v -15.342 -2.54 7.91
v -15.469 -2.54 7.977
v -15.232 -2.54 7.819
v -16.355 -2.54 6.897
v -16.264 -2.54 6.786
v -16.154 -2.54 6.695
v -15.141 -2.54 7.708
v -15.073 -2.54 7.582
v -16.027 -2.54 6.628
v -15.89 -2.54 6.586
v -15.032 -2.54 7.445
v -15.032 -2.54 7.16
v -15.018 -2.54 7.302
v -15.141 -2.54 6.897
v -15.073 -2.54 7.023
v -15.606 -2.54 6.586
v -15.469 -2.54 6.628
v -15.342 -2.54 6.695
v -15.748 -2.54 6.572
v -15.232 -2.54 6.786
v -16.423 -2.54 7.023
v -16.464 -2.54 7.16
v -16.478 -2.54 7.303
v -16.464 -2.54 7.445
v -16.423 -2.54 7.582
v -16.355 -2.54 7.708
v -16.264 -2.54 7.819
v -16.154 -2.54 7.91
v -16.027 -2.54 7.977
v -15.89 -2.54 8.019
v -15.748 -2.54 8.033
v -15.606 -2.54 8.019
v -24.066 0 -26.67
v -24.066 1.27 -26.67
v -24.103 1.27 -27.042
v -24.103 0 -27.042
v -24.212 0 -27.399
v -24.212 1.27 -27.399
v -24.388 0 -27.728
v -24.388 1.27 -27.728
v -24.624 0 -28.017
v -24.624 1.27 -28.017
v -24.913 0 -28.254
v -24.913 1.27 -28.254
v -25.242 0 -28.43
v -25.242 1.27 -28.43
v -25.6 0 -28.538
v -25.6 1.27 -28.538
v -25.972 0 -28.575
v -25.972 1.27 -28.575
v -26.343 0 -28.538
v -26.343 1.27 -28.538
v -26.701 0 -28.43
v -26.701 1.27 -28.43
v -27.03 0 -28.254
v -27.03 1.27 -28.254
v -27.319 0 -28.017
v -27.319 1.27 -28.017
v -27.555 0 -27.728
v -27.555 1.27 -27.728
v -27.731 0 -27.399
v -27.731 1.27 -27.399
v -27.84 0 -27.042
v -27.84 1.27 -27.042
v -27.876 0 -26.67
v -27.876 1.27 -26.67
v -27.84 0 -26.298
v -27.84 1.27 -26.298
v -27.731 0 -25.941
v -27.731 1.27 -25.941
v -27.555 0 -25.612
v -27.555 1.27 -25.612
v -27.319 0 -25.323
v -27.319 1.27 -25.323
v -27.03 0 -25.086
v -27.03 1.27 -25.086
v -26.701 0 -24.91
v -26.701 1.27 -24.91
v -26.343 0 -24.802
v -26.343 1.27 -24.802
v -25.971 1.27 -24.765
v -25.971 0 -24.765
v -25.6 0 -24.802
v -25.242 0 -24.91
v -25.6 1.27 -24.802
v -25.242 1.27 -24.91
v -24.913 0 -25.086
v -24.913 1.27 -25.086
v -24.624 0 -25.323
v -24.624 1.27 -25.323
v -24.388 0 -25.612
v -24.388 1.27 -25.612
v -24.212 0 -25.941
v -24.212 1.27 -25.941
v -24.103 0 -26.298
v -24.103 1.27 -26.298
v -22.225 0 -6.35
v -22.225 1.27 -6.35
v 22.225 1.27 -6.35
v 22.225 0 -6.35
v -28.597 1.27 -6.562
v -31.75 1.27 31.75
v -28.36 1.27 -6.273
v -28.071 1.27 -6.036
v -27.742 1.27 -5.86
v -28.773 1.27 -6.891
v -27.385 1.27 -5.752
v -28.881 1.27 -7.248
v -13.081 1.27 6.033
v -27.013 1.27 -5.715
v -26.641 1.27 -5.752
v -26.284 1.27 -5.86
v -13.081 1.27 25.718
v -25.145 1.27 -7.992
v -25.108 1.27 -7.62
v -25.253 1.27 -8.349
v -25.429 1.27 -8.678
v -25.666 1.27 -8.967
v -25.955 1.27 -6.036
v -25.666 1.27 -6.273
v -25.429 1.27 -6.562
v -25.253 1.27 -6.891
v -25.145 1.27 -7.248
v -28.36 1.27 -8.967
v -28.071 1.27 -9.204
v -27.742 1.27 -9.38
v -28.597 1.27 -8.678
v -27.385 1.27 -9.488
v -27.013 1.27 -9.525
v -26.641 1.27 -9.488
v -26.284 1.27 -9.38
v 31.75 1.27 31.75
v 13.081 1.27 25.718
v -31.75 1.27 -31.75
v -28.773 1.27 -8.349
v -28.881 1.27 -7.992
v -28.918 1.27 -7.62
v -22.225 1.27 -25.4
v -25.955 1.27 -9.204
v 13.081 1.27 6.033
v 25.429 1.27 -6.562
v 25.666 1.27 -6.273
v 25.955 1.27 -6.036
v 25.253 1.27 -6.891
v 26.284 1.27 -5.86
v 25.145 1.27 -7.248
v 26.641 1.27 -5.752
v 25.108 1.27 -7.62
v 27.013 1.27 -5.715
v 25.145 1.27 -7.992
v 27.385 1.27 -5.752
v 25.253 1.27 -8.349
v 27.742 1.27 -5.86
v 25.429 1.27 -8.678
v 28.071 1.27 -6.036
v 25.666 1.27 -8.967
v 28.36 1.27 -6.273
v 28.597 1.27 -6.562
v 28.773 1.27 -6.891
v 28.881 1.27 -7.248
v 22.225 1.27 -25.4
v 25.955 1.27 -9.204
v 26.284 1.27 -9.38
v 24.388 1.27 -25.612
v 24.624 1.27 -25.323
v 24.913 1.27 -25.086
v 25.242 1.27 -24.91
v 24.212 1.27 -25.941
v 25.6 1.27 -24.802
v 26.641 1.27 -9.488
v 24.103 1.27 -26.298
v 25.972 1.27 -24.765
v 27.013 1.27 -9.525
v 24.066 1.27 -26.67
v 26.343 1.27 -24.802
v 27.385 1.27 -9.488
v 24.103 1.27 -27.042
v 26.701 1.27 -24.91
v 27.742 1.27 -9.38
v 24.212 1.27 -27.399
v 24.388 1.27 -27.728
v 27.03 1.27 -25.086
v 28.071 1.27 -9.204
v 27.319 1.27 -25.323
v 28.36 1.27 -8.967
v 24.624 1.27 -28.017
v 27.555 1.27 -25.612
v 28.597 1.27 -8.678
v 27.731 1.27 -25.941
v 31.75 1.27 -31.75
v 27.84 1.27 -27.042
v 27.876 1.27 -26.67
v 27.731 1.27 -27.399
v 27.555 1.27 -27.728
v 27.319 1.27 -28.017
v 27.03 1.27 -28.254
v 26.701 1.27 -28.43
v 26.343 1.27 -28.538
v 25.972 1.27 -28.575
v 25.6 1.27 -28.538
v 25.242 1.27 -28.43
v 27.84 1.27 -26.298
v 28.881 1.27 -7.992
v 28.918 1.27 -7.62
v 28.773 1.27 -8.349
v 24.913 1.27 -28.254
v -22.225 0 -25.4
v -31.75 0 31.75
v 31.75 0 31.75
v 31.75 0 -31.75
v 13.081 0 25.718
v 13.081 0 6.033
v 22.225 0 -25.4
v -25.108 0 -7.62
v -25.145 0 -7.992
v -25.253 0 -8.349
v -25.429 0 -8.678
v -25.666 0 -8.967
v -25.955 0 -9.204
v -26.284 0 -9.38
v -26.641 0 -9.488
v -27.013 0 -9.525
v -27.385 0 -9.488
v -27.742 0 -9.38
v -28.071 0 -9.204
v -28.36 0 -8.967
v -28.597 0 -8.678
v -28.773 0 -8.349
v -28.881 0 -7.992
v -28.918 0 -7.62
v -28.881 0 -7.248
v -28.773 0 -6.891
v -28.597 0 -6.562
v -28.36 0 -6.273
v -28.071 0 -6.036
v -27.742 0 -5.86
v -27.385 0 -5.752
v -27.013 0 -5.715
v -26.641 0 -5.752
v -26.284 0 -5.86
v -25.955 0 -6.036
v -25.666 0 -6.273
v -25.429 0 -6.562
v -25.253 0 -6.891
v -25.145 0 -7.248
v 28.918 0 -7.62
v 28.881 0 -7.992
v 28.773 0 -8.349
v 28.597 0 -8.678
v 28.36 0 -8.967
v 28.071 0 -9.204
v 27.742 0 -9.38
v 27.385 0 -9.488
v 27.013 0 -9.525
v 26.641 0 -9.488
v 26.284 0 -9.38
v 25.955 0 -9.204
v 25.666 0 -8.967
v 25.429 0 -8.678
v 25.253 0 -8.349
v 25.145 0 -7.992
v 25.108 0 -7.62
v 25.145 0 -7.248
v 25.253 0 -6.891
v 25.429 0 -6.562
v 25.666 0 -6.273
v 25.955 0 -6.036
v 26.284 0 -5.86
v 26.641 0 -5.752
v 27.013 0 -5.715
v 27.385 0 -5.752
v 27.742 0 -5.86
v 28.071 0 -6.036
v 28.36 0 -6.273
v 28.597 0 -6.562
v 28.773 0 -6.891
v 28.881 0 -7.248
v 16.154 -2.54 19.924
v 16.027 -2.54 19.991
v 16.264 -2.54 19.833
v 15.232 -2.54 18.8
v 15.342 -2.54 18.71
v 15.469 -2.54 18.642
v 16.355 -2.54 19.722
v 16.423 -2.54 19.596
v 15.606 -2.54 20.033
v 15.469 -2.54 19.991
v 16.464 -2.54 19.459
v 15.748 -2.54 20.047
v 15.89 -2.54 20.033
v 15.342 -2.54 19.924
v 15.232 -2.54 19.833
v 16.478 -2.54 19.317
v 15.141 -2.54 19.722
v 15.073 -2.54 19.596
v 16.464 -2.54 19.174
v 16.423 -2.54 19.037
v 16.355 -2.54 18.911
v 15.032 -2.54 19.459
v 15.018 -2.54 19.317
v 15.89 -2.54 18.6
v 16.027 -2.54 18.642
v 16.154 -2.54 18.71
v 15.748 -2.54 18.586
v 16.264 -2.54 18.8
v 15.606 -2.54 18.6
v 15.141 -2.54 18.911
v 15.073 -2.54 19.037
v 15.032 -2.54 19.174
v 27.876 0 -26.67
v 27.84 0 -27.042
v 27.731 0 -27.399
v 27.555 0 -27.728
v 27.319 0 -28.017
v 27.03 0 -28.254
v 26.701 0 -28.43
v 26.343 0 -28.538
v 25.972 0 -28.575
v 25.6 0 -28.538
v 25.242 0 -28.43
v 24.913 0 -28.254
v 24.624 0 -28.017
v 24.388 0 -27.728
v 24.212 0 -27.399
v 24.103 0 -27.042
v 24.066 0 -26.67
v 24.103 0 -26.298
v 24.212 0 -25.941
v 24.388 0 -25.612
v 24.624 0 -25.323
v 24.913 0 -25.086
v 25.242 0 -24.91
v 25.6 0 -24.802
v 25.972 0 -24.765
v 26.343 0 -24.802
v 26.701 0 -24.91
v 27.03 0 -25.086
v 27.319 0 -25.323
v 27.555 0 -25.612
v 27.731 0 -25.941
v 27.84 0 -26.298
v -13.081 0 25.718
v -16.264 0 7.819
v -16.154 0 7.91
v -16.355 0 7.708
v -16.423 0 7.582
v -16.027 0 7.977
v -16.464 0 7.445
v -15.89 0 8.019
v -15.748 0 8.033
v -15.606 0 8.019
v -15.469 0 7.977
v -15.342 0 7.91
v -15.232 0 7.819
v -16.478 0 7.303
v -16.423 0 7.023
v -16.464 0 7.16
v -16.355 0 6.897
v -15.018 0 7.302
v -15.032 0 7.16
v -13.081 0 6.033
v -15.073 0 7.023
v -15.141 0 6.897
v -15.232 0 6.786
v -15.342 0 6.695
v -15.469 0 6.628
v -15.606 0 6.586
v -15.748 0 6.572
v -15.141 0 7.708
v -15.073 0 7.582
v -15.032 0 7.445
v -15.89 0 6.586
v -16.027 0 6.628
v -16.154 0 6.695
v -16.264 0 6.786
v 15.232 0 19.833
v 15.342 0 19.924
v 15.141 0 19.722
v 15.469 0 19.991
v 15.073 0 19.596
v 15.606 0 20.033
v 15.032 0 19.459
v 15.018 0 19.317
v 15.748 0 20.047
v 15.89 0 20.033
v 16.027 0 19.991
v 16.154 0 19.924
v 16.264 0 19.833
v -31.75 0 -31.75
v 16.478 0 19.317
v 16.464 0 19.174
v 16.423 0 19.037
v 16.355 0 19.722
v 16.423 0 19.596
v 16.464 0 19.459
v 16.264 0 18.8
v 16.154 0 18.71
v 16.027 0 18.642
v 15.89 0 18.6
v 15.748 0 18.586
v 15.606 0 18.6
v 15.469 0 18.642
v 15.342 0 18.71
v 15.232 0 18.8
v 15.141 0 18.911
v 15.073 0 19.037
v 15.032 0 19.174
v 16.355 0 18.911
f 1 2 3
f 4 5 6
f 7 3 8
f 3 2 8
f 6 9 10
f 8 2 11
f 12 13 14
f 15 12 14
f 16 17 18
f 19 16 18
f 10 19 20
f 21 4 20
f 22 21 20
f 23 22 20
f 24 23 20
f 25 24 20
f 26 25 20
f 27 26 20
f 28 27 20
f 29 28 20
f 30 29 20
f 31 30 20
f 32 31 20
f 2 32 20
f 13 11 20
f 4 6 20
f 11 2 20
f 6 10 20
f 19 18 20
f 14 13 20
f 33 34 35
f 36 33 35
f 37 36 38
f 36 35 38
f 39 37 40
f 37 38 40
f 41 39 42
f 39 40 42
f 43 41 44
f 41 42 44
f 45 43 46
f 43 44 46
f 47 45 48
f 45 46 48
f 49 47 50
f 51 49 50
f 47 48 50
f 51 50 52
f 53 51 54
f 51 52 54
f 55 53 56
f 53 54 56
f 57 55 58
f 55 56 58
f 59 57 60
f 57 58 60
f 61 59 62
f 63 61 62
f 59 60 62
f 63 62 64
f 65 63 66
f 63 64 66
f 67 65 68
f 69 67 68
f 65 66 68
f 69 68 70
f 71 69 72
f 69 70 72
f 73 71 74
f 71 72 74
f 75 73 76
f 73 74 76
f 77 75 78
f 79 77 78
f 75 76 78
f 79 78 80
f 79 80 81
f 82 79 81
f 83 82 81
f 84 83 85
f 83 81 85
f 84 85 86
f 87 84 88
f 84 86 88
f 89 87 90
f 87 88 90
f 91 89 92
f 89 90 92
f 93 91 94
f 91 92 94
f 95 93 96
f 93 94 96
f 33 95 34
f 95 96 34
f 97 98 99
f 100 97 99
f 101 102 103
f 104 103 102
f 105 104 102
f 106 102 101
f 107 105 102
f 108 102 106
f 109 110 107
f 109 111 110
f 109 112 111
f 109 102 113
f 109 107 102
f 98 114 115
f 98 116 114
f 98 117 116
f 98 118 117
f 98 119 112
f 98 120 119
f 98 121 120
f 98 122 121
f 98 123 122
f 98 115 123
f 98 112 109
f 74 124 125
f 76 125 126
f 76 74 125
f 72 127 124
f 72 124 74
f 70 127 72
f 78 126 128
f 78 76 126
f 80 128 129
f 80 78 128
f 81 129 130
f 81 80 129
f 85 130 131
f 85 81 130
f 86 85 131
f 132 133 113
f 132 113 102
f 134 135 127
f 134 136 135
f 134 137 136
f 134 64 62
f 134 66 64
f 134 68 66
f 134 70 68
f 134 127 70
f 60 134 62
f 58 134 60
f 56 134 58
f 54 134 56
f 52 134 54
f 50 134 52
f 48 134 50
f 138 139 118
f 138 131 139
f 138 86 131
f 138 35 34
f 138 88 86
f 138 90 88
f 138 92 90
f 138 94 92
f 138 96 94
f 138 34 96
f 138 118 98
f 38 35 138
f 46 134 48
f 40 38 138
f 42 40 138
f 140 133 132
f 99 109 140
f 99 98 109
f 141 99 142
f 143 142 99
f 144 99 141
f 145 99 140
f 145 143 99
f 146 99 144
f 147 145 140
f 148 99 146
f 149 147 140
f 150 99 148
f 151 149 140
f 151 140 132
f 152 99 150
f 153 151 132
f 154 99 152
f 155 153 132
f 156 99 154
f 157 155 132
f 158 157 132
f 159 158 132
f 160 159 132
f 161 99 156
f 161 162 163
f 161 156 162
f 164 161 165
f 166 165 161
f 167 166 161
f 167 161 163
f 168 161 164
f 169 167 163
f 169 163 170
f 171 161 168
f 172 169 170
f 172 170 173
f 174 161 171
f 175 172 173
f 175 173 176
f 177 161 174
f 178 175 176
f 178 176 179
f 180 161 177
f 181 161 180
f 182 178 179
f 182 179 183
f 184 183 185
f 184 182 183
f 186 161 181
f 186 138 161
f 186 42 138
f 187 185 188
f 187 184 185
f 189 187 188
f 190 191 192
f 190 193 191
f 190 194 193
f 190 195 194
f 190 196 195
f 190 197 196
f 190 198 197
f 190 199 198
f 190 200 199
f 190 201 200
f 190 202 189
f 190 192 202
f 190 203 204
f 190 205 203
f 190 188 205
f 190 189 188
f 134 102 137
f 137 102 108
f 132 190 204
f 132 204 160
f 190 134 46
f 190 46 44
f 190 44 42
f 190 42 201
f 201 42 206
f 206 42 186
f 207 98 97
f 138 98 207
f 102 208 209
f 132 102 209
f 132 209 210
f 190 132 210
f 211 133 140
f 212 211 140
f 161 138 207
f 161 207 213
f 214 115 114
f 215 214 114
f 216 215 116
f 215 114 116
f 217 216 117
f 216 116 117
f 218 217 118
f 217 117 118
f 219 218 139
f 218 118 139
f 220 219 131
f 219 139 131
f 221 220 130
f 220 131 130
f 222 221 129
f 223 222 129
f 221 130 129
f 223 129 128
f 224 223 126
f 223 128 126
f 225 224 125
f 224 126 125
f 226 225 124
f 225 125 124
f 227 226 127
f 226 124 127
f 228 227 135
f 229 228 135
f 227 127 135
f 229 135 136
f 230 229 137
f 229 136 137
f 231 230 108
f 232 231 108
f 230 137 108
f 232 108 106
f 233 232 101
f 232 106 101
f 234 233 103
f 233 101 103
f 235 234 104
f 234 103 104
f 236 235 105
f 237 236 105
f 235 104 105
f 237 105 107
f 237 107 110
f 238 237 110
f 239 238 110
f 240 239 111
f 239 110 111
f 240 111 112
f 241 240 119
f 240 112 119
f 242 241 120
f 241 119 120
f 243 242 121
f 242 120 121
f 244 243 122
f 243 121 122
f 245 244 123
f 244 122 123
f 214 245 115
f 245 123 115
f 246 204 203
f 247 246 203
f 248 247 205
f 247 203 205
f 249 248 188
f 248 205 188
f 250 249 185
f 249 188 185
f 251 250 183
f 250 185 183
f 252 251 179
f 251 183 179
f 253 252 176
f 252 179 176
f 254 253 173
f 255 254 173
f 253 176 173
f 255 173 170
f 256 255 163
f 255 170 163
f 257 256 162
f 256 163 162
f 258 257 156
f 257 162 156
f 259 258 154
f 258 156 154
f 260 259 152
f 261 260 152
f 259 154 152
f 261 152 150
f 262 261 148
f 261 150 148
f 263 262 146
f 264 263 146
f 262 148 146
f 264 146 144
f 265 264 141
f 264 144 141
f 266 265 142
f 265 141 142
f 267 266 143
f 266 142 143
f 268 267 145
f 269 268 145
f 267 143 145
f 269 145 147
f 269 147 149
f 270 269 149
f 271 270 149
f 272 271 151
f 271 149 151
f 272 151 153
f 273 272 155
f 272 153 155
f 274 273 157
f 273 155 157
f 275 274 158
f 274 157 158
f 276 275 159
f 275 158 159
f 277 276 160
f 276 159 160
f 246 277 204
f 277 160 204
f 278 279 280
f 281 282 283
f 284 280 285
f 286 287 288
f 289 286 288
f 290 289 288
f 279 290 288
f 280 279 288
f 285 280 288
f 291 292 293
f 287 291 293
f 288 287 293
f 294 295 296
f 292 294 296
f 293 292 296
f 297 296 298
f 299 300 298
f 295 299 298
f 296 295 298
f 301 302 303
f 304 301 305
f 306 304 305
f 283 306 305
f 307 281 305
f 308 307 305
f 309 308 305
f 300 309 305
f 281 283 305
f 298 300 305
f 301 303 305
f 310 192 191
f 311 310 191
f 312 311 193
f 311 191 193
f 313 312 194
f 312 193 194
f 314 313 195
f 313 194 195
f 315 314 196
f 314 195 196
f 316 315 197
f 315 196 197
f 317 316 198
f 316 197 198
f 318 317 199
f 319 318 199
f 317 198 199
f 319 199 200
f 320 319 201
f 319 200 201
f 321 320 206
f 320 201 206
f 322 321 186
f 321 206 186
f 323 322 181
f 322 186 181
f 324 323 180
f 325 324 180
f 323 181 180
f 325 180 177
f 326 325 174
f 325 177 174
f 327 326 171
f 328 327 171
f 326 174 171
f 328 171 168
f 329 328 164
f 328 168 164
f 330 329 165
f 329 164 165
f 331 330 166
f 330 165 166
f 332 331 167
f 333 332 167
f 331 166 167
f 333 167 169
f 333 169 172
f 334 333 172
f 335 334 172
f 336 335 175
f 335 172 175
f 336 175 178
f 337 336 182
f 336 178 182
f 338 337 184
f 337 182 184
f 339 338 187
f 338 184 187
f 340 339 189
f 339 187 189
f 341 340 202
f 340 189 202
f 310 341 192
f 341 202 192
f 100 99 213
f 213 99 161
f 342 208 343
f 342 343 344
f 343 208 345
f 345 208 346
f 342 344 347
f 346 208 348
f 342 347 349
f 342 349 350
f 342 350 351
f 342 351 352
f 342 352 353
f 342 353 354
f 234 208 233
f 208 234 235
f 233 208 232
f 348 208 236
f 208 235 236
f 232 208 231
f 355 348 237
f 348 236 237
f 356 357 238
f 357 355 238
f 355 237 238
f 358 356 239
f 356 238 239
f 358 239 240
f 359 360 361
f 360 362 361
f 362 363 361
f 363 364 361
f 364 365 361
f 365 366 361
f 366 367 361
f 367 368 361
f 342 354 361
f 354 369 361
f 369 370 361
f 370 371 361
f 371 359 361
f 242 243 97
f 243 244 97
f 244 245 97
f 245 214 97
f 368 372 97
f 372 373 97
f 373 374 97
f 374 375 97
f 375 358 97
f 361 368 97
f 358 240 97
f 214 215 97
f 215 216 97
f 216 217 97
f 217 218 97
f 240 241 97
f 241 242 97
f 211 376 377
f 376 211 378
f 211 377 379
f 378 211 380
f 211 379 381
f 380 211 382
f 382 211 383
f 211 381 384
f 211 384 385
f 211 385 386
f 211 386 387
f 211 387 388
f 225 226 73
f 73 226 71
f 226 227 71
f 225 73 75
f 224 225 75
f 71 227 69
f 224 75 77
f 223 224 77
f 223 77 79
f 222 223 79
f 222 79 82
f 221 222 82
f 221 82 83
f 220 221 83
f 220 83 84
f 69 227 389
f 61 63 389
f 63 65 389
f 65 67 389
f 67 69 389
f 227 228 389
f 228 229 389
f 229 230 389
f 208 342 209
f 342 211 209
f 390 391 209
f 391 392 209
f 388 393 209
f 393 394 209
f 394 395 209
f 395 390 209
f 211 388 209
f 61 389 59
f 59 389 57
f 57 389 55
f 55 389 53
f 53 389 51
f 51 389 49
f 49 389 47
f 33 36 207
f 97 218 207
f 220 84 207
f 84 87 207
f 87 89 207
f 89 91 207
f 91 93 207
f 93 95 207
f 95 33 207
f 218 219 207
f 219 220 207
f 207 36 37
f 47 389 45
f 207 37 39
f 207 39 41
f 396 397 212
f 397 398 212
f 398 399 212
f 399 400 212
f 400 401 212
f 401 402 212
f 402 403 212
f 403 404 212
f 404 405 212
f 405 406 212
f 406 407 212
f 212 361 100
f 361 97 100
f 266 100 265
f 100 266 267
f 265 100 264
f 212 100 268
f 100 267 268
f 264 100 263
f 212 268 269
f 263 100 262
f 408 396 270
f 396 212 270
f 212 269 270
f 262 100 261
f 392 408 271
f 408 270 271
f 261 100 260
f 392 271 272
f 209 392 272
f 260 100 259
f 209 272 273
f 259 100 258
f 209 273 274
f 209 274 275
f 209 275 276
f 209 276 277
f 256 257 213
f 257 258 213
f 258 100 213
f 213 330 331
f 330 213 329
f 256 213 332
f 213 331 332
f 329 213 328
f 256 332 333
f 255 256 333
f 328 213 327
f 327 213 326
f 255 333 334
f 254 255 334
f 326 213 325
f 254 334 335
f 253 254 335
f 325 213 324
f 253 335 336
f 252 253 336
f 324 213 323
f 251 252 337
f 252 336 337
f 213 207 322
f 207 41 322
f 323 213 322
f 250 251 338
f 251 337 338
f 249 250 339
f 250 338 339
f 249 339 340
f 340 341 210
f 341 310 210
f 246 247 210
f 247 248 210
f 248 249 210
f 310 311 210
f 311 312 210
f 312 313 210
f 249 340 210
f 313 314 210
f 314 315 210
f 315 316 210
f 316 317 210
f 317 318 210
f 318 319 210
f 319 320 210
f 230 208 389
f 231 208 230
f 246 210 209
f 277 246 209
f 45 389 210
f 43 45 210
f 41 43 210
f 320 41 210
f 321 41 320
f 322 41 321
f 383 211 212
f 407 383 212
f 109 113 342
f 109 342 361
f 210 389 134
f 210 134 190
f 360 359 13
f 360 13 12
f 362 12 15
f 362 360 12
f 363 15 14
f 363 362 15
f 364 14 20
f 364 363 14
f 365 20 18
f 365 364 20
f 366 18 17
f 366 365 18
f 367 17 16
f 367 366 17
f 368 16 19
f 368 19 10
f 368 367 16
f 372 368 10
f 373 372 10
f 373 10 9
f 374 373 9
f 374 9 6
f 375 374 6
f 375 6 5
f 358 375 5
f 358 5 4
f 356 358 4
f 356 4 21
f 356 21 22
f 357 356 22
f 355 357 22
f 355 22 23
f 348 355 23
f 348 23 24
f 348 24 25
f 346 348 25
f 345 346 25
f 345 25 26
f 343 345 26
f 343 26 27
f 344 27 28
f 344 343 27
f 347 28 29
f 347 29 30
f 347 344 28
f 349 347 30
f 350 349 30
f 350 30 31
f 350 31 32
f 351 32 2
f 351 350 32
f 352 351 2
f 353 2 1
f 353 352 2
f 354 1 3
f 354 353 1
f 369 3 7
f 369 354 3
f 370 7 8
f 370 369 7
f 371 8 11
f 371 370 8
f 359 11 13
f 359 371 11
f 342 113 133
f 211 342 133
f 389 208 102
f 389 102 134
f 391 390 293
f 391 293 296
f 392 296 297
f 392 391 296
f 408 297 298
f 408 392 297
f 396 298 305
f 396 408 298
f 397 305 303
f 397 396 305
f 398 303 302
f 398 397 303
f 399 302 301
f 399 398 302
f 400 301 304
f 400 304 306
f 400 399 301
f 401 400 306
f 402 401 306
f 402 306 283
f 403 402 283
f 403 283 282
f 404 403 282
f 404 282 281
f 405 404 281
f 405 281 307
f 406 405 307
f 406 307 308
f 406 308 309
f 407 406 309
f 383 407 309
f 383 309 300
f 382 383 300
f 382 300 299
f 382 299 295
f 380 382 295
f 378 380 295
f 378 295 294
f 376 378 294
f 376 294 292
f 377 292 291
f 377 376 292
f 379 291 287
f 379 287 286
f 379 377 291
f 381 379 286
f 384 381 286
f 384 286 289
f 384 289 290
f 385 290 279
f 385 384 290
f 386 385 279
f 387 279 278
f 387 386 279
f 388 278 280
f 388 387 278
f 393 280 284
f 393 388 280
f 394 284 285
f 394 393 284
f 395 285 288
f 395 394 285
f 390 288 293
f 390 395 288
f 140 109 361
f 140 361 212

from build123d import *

# Parameters (mm, degrees)
SKETCH1_W           = 63.5
SKETCH1_H           = 63.5
BOSS_EXTRUDE1_DEPTH = 1.27
SKETCH2_R           = 1.905
CUT_EXTRUDE1_DEPTH  = 1.27
SKETCH3_W           = 44.45
SKETCH3_H           = 19.05
CUT_EXTRUDE2_DEPTH  = 1.27
SKETCH4_R           = 0.73025
BOSS_EXTRUDE2_DEPTH = 3.81
CUT_EXTRUDE3_REACH  = 5.81
SKETCH5_W           = 26.162
SKETCH5_H           = 19.685


with BuildPart() as part:
    # Sketch1 → Boss-Extrude1 (new body)
    with BuildSketch(Plane(origin=(0, 0, 0), x_dir=(1, 0, 0), z_dir=(0, 1, 0))):
        Rectangle(SKETCH1_W, SKETCH1_H)
    extrude(amount=BOSS_EXTRUDE1_DEPTH)

    # Sketch2 → Cut-Extrude1 (cut)
    with BuildSketch(Plane(origin=(0, 1.27, 0), x_dir=(1, 0, 0), z_dir=(0, 1, 0))):
        with Locations((27.0129, 7.62)):
            Circle(SKETCH2_R)
        with Locations((25.9715, 26.67)):
            Circle(SKETCH2_R)
        with Locations((-27.0129, 7.62)):
            Circle(SKETCH2_R)
        with Locations((-25.9715, 26.67)):
            Circle(SKETCH2_R)
    extrude(amount=-CUT_EXTRUDE1_DEPTH, mode=Mode.SUBTRACT)

    # Sketch3 → Cut-Extrude2 (cut)
    with BuildSketch(Plane(origin=(0, 1.27, 0), x_dir=(1, 0, 0), z_dir=(0, 1, 0))):
        with Locations((0, 15.875)):
            Rectangle(SKETCH3_W, SKETCH3_H)
    extrude(amount=-CUT_EXTRUDE2_DEPTH, mode=Mode.SUBTRACT)

    # Sketch4 → Boss-Extrude2 (add)
    with BuildSketch(Plane(origin=(0, 1.27, 0), x_dir=(1, 0, 0), z_dir=(0, 1, 0))):
        with Locations((-15.748, -7.3025)):
            Circle(SKETCH4_R)
        with Locations((15.748, -19.3167)):
            Circle(SKETCH4_R)
    extrude(amount=-BOSS_EXTRUDE2_DEPTH)

    # Sketch5 → Cut-Extrude3 (cut, up to next)
    with BuildSketch(Plane(origin=(0, 1.27, 0), x_dir=(1, 0, 0), z_dir=(0, 1, 0)), mode=Mode.PRIVATE) as cut_extrude3_sk1:
        with Locations((0, -15.875)):
            Rectangle(SKETCH5_W, SKETCH5_H)
    cut_extrude3_tool1 = extrude(cut_extrude3_sk1.sketch, amount=-CUT_EXTRUDE3_REACH, mode=Mode.PRIVATE) & part.part
    add(cut_extrude3_tool1.solids().sort_by_distance((0, 1.27, 15.875))[0], mode=Mode.SUBTRACT)


solid = part.part
